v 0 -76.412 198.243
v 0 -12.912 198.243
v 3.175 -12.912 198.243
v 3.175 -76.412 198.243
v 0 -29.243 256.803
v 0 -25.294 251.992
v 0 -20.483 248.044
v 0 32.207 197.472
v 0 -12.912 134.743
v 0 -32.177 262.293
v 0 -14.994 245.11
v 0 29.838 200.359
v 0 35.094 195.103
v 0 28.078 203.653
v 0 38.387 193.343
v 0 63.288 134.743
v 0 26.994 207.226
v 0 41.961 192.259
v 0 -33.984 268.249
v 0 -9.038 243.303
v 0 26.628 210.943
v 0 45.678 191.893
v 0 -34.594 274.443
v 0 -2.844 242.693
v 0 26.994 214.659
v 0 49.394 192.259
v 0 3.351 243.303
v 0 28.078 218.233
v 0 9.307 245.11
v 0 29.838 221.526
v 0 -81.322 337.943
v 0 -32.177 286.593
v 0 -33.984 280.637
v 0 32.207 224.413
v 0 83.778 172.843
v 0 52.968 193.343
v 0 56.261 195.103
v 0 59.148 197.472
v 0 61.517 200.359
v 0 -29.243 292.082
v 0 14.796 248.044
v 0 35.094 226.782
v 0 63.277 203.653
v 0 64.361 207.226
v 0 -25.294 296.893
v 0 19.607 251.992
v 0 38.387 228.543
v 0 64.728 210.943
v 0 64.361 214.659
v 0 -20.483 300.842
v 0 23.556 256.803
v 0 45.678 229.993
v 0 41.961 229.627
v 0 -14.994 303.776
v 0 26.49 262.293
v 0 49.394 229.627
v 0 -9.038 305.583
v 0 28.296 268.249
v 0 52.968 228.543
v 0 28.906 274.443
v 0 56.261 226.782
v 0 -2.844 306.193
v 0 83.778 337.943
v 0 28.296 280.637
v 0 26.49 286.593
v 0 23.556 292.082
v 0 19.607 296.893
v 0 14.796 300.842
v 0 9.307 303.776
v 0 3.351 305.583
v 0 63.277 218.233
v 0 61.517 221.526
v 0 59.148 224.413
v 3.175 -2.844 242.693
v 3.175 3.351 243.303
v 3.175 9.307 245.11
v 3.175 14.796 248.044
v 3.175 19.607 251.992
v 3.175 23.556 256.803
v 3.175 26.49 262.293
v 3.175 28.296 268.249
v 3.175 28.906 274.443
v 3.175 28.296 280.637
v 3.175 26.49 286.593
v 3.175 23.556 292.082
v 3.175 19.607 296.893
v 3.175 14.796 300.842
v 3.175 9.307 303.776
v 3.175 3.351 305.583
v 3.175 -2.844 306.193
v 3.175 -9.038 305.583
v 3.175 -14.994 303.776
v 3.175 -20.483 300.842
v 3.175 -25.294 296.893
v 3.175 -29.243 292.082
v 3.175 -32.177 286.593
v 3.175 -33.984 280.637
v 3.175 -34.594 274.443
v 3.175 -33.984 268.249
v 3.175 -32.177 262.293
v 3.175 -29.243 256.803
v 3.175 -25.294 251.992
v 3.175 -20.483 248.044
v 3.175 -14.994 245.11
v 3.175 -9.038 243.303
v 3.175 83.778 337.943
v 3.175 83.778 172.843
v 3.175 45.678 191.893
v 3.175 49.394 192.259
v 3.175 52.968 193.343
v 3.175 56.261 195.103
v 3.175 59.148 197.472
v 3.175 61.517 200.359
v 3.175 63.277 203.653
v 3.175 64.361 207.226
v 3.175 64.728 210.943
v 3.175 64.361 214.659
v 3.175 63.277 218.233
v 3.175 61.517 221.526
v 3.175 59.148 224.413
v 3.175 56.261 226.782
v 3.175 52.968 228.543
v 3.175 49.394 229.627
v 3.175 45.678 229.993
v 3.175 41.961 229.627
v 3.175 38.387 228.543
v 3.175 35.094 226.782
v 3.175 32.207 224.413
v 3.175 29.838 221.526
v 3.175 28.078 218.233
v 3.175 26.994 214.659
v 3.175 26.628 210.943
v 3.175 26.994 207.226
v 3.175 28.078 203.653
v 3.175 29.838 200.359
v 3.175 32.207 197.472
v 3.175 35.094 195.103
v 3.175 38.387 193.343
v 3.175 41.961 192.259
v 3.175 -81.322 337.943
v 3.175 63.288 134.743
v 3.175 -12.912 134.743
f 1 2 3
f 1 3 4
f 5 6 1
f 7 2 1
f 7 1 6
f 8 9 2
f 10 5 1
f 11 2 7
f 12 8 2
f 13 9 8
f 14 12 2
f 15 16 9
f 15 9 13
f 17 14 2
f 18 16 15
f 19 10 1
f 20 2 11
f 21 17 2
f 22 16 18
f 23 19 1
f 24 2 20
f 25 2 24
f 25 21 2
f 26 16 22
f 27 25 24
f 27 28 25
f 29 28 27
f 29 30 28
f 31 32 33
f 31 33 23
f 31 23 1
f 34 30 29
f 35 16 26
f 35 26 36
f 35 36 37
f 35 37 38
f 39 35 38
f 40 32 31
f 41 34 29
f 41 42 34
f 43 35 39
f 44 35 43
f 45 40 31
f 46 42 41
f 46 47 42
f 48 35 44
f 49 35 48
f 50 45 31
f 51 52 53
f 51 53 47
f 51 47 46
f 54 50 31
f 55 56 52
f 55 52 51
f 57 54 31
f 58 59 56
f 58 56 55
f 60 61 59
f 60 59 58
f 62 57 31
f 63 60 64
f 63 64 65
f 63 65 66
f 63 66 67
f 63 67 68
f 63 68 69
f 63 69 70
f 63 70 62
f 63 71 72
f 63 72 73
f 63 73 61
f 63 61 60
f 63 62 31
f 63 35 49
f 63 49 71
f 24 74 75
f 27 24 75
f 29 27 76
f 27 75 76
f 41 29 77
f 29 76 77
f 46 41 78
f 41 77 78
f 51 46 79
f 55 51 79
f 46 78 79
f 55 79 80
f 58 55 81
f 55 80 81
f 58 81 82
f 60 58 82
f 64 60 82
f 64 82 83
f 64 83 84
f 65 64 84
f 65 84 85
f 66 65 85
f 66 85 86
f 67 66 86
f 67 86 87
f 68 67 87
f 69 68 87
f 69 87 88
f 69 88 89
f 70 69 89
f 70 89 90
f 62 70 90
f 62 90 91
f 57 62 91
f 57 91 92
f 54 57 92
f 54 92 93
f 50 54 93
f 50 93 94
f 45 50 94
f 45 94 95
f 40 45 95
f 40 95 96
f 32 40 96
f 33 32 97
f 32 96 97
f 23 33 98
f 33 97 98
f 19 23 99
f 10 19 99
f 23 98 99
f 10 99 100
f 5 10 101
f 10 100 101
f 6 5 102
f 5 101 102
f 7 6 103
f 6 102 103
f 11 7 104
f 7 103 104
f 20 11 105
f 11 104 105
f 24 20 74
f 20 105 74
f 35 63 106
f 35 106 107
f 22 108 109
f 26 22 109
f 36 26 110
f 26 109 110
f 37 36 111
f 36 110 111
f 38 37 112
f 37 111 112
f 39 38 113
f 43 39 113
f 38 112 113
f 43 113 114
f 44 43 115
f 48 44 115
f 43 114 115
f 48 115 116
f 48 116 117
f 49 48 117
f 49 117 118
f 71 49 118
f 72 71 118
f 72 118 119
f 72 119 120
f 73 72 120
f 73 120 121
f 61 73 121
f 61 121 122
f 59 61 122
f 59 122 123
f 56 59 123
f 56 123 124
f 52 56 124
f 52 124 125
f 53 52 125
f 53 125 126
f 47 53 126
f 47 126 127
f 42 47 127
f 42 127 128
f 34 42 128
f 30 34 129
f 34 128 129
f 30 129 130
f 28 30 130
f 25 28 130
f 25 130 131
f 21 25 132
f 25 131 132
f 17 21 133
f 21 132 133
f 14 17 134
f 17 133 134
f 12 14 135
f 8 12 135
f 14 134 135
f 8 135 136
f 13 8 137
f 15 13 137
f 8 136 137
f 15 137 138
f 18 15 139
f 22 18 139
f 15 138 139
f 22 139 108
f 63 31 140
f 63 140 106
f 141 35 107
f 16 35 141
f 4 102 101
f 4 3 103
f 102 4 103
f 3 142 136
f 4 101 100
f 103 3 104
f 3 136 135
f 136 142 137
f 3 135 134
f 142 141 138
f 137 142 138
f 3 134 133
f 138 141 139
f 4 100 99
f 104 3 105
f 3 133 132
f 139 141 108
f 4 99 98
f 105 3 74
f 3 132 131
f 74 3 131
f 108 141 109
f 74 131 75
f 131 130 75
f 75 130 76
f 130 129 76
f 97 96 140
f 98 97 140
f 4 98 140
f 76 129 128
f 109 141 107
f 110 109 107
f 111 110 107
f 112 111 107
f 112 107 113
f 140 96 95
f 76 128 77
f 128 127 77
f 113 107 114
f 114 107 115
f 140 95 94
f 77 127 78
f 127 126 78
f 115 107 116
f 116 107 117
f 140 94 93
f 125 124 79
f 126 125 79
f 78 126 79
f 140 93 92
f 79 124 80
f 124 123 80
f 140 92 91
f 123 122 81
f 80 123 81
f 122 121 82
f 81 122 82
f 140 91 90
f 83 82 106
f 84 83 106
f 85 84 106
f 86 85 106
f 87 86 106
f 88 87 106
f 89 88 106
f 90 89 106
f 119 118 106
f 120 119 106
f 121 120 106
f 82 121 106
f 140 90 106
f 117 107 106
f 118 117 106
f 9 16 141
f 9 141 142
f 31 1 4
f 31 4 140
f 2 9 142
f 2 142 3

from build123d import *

# Parameters (mm, degrees)
BOSS_EXTRUDE1_DEPTH = 3.175
SKETCH3_R           = 31.75
SKETCH3_R_2         = 19.05
CUT_EXTRUDE3_DEPTH  = 349.186809908


with BuildPart() as part:
    # Sketch2 → Boss-Extrude1 (new body)
    with BuildSketch(Plane(origin=(0, 0, 0), x_dir=(0, 0, -1), z_dir=(1, 0, 0))):
        Polygon((-337.942750929, 83.777509294), (-172.842750929, 83.777509294), (-134.742750929, 63.287546468), (-134.742750929, -12.912453532), (-198.242750929, -12.912453532), (-198.242750929, -76.412453532), (-337.942750929, -81.322490706), align=None)
    extrude(amount=BOSS_EXTRUDE1_DEPTH)

    # Sketch3 → Cut-Extrude3 (cut, through all)
    with BuildSketch(Plane(origin=(3.175, 0, 0), x_dir=(0, 0, -1), z_dir=(1, 0, 0))):
        with Locations((-274.442750929, -2.843604756)):
            Circle(SKETCH3_R)
        with Locations((-210.942750929, 45.677509294)):
            Circle(SKETCH3_R_2)
    extrude(amount=-CUT_EXTRUDE3_DEPTH, mode=Mode.SUBTRACT)


solid = part.part
